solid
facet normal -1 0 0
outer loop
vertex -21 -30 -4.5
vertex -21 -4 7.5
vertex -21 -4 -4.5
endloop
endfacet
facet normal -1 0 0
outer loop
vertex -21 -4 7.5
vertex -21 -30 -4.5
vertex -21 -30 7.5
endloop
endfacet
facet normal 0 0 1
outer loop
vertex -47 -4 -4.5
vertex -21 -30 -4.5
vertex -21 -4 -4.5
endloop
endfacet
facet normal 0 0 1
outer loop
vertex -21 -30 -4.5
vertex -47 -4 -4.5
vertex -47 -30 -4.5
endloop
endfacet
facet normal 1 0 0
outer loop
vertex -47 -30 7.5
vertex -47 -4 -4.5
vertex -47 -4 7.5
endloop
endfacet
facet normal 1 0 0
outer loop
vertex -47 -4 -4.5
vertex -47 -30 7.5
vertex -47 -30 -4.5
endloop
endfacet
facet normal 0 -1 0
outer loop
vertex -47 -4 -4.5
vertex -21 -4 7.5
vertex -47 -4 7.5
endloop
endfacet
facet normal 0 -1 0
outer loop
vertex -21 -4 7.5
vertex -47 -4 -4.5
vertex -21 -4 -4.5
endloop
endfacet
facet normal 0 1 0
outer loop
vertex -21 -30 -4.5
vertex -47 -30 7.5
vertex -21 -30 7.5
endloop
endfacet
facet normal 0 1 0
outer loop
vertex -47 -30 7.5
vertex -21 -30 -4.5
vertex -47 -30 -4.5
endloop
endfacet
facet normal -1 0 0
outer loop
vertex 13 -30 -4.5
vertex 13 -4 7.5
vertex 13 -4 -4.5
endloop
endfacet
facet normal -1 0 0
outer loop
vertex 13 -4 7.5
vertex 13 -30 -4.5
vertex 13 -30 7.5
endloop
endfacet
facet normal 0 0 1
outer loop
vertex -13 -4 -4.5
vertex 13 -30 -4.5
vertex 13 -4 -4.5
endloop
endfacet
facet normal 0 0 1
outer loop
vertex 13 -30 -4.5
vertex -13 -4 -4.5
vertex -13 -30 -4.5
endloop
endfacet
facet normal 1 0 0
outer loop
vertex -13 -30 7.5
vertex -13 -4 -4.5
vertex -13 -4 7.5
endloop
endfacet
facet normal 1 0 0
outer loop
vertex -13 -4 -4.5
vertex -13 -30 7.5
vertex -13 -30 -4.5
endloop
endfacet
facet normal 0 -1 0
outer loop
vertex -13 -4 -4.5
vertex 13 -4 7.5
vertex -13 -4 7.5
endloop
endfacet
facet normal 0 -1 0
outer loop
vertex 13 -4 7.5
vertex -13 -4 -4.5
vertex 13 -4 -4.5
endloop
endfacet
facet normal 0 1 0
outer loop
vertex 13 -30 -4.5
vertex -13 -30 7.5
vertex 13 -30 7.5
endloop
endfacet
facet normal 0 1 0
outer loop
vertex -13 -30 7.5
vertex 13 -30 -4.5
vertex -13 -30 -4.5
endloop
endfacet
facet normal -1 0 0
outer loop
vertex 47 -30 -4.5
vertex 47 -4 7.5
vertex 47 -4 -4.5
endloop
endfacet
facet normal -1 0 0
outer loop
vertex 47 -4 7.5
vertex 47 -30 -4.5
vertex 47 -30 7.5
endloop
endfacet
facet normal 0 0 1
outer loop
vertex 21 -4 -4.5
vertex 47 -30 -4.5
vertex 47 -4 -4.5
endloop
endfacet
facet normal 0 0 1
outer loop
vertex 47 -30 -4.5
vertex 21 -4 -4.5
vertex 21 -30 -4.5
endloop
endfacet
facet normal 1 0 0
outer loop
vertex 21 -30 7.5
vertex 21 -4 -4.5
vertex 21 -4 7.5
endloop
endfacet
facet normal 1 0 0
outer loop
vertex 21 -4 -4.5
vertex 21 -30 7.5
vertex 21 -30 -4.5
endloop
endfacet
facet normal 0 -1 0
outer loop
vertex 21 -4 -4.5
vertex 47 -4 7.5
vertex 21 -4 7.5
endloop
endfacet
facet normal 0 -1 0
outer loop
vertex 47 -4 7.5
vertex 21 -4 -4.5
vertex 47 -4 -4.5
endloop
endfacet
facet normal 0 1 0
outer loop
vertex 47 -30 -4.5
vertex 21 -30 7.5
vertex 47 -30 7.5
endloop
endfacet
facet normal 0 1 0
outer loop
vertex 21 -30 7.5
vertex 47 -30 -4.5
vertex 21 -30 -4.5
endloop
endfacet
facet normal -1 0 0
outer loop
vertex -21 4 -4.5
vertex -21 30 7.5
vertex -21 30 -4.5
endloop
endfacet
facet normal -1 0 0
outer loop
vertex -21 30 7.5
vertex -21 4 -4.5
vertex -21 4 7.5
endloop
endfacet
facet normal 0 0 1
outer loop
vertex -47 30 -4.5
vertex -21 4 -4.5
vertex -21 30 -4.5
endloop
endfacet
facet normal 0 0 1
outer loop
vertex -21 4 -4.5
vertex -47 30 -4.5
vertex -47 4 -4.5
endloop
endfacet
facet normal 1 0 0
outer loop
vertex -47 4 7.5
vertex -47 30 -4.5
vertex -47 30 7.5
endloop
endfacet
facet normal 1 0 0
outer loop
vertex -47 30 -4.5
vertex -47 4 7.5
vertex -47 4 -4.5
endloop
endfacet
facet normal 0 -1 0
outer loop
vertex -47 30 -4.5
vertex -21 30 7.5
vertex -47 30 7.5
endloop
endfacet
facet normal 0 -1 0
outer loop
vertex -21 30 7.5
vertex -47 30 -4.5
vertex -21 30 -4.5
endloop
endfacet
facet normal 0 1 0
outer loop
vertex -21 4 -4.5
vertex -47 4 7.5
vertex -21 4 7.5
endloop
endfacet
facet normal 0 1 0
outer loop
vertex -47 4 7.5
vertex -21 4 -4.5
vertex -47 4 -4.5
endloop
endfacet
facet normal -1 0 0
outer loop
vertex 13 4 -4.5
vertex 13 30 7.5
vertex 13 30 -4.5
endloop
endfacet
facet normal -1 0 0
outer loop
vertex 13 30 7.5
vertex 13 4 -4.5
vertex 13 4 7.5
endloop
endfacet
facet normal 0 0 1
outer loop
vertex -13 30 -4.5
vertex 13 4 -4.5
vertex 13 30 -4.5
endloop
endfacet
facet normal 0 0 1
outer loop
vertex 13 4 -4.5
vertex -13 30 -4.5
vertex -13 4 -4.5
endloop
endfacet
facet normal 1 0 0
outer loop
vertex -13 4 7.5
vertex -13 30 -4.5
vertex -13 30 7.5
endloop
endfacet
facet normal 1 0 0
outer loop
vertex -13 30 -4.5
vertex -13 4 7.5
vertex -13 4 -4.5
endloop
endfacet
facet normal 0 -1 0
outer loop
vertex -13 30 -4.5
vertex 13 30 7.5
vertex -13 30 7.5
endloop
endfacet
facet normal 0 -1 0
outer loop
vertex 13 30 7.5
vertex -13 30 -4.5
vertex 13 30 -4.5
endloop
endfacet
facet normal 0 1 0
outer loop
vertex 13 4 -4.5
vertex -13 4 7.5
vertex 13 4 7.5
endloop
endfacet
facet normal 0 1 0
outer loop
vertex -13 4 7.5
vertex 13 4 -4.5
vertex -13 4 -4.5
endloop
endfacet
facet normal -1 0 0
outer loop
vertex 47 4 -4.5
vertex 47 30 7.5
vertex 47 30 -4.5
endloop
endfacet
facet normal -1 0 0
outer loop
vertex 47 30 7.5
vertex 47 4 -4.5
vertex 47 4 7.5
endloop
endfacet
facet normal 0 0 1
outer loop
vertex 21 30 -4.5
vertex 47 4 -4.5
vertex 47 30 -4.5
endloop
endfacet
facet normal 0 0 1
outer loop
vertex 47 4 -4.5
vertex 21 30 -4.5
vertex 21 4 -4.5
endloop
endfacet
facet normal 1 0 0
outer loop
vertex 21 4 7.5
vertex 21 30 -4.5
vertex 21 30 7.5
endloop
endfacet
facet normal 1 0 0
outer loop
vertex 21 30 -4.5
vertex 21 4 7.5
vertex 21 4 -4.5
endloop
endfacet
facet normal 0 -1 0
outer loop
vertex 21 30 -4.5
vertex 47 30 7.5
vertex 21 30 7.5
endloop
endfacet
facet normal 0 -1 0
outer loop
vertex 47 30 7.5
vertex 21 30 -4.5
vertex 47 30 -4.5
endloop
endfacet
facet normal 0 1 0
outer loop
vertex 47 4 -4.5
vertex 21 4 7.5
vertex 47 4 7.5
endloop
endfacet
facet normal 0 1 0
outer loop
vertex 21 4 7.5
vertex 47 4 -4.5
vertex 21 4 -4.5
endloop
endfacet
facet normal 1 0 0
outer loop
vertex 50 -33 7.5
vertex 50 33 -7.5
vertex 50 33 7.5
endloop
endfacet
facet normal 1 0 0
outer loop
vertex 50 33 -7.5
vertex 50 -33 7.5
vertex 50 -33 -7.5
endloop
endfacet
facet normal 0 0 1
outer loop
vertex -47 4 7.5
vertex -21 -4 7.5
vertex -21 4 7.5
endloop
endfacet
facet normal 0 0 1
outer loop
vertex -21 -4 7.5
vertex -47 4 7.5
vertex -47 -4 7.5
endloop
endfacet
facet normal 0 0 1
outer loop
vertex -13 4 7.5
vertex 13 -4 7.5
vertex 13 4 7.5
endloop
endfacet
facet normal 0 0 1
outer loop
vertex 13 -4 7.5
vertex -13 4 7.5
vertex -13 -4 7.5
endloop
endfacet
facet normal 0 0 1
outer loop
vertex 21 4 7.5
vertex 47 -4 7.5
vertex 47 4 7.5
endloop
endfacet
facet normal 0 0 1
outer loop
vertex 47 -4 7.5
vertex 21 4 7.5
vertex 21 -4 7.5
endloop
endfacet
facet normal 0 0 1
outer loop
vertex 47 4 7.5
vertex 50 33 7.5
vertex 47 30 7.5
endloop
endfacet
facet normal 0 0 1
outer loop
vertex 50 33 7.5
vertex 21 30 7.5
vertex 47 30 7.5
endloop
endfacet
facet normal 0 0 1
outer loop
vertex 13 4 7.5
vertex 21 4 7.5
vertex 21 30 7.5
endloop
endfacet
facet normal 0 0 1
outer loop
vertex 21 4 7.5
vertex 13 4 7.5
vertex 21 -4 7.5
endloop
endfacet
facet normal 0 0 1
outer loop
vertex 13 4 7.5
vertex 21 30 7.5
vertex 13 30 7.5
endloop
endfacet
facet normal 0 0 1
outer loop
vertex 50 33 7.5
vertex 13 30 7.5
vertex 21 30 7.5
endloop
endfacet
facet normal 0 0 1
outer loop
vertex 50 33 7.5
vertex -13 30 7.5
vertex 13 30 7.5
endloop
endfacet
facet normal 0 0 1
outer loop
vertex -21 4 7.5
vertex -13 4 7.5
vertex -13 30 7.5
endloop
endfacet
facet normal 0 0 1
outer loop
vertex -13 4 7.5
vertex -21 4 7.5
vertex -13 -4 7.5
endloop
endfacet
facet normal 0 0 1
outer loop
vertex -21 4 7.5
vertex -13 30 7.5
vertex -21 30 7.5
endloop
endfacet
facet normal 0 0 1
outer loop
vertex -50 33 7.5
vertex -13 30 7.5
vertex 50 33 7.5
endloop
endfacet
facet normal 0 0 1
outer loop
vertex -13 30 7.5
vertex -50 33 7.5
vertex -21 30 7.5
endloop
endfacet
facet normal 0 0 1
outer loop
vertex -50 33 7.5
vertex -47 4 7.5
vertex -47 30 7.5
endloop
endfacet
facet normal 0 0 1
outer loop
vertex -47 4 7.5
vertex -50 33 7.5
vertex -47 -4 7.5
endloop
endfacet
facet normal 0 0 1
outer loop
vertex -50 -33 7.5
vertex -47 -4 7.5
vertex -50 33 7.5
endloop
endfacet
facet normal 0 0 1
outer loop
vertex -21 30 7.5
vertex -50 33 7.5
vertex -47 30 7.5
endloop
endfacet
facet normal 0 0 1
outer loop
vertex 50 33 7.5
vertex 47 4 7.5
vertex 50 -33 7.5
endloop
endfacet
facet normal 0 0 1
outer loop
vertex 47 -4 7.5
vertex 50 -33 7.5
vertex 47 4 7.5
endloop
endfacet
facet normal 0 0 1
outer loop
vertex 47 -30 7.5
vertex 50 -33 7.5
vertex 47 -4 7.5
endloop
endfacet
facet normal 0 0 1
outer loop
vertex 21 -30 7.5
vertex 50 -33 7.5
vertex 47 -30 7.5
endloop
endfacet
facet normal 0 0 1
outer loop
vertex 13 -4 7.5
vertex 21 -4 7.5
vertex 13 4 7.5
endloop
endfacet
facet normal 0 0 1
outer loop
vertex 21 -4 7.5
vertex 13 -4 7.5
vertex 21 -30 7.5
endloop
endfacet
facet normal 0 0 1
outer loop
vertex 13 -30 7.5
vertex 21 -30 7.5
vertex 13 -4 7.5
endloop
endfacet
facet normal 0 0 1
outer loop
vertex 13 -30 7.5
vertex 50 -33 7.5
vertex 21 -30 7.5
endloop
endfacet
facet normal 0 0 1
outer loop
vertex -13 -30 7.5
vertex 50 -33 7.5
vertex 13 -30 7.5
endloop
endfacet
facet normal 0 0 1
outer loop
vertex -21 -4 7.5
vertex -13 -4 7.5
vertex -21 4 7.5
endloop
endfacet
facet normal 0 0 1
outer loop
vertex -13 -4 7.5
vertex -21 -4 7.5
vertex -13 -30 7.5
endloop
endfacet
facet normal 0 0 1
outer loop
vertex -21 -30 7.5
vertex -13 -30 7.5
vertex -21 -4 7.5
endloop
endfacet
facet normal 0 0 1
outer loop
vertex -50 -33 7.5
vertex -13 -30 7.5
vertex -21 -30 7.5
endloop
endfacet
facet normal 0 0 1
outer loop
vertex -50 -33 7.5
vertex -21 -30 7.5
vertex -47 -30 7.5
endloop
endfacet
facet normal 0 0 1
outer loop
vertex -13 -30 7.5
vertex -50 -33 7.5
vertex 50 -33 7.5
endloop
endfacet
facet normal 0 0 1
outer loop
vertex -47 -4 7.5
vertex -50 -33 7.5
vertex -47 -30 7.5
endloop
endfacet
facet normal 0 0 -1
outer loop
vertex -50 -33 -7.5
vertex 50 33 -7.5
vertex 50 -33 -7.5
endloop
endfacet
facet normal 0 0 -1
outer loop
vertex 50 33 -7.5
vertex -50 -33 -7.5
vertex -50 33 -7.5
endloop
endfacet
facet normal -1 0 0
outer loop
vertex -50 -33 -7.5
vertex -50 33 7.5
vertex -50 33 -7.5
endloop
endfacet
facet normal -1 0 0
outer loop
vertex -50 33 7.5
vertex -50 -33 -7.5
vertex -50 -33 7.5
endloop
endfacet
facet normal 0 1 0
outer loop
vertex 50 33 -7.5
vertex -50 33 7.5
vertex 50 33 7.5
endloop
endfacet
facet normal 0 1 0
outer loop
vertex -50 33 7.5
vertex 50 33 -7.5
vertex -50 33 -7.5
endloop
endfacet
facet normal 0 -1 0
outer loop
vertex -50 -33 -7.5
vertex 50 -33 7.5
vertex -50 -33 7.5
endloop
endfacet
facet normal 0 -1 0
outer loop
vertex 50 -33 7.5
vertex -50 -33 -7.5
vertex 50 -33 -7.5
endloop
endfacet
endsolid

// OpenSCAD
$fn = 32;

// ----------------------------------------------------------------------
// Pocket plate 100 x 66 x 15
// 2 x 3 pockets 26 mm square, 12 mm deep
// ----------------------------------------------------------------------

// --- parameters (mm) ---
thickness = 15;  // plate thickness
floor_t = 3;     // material left under each pocket
pocket = 26;     // pocket side length
pitch_x = 34;    // pocket pitch along X
pitch_y = 34;    // pocket pitch along Y
cols = 3;        // pockets per row
rows = 2;        // rows of pockets

// --- derived feature positions (mm) ---
depth = thickness - floor_t;        // = 12   pocket depth, down to the floor
span_x = (cols - 1) * pitch_x;      // = 68   distance between outer pockets
span_y = (rows - 1) * pitch_y;      // = 34   distance between outer pocket rows
origin_x = -span_x / 2;             // = -34   X of the first pocket
origin_y = -span_y / 2;             // = -17   Y of the first pocket
plate = [span_x + pocket + 6, span_y + pocket + 6, thickness];  // = [100, 66, 15]   overall size: pockets plus 3 mm of wall on each side
feature_centers = [
  [origin_x + 0 * pitch_x, origin_y + 0 * pitch_y],
  [origin_x + 1 * pitch_x, origin_y + 0 * pitch_y],
  [origin_x + 2 * pitch_x, origin_y + 0 * pitch_y],
  [origin_x + 0 * pitch_x, origin_y + 1 * pitch_y],
  [origin_x + 1 * pitch_x, origin_y + 1 * pitch_y],
  [origin_x + 2 * pitch_x, origin_y + 1 * pitch_y]
];   // pocket centres, used verbatim by the cutter loop

// plate outline, then one pocket per centre in feature_centers
difference() {
  cube(plate, center = true);
  for (centre = feature_centers)
    translate([centre[0] - pocket / 2, centre[1] - pocket / 2, plate[2] / 2 - depth])
      cube([pocket, pocket, depth + 1]);  // centred on the declared pocket centre
}
